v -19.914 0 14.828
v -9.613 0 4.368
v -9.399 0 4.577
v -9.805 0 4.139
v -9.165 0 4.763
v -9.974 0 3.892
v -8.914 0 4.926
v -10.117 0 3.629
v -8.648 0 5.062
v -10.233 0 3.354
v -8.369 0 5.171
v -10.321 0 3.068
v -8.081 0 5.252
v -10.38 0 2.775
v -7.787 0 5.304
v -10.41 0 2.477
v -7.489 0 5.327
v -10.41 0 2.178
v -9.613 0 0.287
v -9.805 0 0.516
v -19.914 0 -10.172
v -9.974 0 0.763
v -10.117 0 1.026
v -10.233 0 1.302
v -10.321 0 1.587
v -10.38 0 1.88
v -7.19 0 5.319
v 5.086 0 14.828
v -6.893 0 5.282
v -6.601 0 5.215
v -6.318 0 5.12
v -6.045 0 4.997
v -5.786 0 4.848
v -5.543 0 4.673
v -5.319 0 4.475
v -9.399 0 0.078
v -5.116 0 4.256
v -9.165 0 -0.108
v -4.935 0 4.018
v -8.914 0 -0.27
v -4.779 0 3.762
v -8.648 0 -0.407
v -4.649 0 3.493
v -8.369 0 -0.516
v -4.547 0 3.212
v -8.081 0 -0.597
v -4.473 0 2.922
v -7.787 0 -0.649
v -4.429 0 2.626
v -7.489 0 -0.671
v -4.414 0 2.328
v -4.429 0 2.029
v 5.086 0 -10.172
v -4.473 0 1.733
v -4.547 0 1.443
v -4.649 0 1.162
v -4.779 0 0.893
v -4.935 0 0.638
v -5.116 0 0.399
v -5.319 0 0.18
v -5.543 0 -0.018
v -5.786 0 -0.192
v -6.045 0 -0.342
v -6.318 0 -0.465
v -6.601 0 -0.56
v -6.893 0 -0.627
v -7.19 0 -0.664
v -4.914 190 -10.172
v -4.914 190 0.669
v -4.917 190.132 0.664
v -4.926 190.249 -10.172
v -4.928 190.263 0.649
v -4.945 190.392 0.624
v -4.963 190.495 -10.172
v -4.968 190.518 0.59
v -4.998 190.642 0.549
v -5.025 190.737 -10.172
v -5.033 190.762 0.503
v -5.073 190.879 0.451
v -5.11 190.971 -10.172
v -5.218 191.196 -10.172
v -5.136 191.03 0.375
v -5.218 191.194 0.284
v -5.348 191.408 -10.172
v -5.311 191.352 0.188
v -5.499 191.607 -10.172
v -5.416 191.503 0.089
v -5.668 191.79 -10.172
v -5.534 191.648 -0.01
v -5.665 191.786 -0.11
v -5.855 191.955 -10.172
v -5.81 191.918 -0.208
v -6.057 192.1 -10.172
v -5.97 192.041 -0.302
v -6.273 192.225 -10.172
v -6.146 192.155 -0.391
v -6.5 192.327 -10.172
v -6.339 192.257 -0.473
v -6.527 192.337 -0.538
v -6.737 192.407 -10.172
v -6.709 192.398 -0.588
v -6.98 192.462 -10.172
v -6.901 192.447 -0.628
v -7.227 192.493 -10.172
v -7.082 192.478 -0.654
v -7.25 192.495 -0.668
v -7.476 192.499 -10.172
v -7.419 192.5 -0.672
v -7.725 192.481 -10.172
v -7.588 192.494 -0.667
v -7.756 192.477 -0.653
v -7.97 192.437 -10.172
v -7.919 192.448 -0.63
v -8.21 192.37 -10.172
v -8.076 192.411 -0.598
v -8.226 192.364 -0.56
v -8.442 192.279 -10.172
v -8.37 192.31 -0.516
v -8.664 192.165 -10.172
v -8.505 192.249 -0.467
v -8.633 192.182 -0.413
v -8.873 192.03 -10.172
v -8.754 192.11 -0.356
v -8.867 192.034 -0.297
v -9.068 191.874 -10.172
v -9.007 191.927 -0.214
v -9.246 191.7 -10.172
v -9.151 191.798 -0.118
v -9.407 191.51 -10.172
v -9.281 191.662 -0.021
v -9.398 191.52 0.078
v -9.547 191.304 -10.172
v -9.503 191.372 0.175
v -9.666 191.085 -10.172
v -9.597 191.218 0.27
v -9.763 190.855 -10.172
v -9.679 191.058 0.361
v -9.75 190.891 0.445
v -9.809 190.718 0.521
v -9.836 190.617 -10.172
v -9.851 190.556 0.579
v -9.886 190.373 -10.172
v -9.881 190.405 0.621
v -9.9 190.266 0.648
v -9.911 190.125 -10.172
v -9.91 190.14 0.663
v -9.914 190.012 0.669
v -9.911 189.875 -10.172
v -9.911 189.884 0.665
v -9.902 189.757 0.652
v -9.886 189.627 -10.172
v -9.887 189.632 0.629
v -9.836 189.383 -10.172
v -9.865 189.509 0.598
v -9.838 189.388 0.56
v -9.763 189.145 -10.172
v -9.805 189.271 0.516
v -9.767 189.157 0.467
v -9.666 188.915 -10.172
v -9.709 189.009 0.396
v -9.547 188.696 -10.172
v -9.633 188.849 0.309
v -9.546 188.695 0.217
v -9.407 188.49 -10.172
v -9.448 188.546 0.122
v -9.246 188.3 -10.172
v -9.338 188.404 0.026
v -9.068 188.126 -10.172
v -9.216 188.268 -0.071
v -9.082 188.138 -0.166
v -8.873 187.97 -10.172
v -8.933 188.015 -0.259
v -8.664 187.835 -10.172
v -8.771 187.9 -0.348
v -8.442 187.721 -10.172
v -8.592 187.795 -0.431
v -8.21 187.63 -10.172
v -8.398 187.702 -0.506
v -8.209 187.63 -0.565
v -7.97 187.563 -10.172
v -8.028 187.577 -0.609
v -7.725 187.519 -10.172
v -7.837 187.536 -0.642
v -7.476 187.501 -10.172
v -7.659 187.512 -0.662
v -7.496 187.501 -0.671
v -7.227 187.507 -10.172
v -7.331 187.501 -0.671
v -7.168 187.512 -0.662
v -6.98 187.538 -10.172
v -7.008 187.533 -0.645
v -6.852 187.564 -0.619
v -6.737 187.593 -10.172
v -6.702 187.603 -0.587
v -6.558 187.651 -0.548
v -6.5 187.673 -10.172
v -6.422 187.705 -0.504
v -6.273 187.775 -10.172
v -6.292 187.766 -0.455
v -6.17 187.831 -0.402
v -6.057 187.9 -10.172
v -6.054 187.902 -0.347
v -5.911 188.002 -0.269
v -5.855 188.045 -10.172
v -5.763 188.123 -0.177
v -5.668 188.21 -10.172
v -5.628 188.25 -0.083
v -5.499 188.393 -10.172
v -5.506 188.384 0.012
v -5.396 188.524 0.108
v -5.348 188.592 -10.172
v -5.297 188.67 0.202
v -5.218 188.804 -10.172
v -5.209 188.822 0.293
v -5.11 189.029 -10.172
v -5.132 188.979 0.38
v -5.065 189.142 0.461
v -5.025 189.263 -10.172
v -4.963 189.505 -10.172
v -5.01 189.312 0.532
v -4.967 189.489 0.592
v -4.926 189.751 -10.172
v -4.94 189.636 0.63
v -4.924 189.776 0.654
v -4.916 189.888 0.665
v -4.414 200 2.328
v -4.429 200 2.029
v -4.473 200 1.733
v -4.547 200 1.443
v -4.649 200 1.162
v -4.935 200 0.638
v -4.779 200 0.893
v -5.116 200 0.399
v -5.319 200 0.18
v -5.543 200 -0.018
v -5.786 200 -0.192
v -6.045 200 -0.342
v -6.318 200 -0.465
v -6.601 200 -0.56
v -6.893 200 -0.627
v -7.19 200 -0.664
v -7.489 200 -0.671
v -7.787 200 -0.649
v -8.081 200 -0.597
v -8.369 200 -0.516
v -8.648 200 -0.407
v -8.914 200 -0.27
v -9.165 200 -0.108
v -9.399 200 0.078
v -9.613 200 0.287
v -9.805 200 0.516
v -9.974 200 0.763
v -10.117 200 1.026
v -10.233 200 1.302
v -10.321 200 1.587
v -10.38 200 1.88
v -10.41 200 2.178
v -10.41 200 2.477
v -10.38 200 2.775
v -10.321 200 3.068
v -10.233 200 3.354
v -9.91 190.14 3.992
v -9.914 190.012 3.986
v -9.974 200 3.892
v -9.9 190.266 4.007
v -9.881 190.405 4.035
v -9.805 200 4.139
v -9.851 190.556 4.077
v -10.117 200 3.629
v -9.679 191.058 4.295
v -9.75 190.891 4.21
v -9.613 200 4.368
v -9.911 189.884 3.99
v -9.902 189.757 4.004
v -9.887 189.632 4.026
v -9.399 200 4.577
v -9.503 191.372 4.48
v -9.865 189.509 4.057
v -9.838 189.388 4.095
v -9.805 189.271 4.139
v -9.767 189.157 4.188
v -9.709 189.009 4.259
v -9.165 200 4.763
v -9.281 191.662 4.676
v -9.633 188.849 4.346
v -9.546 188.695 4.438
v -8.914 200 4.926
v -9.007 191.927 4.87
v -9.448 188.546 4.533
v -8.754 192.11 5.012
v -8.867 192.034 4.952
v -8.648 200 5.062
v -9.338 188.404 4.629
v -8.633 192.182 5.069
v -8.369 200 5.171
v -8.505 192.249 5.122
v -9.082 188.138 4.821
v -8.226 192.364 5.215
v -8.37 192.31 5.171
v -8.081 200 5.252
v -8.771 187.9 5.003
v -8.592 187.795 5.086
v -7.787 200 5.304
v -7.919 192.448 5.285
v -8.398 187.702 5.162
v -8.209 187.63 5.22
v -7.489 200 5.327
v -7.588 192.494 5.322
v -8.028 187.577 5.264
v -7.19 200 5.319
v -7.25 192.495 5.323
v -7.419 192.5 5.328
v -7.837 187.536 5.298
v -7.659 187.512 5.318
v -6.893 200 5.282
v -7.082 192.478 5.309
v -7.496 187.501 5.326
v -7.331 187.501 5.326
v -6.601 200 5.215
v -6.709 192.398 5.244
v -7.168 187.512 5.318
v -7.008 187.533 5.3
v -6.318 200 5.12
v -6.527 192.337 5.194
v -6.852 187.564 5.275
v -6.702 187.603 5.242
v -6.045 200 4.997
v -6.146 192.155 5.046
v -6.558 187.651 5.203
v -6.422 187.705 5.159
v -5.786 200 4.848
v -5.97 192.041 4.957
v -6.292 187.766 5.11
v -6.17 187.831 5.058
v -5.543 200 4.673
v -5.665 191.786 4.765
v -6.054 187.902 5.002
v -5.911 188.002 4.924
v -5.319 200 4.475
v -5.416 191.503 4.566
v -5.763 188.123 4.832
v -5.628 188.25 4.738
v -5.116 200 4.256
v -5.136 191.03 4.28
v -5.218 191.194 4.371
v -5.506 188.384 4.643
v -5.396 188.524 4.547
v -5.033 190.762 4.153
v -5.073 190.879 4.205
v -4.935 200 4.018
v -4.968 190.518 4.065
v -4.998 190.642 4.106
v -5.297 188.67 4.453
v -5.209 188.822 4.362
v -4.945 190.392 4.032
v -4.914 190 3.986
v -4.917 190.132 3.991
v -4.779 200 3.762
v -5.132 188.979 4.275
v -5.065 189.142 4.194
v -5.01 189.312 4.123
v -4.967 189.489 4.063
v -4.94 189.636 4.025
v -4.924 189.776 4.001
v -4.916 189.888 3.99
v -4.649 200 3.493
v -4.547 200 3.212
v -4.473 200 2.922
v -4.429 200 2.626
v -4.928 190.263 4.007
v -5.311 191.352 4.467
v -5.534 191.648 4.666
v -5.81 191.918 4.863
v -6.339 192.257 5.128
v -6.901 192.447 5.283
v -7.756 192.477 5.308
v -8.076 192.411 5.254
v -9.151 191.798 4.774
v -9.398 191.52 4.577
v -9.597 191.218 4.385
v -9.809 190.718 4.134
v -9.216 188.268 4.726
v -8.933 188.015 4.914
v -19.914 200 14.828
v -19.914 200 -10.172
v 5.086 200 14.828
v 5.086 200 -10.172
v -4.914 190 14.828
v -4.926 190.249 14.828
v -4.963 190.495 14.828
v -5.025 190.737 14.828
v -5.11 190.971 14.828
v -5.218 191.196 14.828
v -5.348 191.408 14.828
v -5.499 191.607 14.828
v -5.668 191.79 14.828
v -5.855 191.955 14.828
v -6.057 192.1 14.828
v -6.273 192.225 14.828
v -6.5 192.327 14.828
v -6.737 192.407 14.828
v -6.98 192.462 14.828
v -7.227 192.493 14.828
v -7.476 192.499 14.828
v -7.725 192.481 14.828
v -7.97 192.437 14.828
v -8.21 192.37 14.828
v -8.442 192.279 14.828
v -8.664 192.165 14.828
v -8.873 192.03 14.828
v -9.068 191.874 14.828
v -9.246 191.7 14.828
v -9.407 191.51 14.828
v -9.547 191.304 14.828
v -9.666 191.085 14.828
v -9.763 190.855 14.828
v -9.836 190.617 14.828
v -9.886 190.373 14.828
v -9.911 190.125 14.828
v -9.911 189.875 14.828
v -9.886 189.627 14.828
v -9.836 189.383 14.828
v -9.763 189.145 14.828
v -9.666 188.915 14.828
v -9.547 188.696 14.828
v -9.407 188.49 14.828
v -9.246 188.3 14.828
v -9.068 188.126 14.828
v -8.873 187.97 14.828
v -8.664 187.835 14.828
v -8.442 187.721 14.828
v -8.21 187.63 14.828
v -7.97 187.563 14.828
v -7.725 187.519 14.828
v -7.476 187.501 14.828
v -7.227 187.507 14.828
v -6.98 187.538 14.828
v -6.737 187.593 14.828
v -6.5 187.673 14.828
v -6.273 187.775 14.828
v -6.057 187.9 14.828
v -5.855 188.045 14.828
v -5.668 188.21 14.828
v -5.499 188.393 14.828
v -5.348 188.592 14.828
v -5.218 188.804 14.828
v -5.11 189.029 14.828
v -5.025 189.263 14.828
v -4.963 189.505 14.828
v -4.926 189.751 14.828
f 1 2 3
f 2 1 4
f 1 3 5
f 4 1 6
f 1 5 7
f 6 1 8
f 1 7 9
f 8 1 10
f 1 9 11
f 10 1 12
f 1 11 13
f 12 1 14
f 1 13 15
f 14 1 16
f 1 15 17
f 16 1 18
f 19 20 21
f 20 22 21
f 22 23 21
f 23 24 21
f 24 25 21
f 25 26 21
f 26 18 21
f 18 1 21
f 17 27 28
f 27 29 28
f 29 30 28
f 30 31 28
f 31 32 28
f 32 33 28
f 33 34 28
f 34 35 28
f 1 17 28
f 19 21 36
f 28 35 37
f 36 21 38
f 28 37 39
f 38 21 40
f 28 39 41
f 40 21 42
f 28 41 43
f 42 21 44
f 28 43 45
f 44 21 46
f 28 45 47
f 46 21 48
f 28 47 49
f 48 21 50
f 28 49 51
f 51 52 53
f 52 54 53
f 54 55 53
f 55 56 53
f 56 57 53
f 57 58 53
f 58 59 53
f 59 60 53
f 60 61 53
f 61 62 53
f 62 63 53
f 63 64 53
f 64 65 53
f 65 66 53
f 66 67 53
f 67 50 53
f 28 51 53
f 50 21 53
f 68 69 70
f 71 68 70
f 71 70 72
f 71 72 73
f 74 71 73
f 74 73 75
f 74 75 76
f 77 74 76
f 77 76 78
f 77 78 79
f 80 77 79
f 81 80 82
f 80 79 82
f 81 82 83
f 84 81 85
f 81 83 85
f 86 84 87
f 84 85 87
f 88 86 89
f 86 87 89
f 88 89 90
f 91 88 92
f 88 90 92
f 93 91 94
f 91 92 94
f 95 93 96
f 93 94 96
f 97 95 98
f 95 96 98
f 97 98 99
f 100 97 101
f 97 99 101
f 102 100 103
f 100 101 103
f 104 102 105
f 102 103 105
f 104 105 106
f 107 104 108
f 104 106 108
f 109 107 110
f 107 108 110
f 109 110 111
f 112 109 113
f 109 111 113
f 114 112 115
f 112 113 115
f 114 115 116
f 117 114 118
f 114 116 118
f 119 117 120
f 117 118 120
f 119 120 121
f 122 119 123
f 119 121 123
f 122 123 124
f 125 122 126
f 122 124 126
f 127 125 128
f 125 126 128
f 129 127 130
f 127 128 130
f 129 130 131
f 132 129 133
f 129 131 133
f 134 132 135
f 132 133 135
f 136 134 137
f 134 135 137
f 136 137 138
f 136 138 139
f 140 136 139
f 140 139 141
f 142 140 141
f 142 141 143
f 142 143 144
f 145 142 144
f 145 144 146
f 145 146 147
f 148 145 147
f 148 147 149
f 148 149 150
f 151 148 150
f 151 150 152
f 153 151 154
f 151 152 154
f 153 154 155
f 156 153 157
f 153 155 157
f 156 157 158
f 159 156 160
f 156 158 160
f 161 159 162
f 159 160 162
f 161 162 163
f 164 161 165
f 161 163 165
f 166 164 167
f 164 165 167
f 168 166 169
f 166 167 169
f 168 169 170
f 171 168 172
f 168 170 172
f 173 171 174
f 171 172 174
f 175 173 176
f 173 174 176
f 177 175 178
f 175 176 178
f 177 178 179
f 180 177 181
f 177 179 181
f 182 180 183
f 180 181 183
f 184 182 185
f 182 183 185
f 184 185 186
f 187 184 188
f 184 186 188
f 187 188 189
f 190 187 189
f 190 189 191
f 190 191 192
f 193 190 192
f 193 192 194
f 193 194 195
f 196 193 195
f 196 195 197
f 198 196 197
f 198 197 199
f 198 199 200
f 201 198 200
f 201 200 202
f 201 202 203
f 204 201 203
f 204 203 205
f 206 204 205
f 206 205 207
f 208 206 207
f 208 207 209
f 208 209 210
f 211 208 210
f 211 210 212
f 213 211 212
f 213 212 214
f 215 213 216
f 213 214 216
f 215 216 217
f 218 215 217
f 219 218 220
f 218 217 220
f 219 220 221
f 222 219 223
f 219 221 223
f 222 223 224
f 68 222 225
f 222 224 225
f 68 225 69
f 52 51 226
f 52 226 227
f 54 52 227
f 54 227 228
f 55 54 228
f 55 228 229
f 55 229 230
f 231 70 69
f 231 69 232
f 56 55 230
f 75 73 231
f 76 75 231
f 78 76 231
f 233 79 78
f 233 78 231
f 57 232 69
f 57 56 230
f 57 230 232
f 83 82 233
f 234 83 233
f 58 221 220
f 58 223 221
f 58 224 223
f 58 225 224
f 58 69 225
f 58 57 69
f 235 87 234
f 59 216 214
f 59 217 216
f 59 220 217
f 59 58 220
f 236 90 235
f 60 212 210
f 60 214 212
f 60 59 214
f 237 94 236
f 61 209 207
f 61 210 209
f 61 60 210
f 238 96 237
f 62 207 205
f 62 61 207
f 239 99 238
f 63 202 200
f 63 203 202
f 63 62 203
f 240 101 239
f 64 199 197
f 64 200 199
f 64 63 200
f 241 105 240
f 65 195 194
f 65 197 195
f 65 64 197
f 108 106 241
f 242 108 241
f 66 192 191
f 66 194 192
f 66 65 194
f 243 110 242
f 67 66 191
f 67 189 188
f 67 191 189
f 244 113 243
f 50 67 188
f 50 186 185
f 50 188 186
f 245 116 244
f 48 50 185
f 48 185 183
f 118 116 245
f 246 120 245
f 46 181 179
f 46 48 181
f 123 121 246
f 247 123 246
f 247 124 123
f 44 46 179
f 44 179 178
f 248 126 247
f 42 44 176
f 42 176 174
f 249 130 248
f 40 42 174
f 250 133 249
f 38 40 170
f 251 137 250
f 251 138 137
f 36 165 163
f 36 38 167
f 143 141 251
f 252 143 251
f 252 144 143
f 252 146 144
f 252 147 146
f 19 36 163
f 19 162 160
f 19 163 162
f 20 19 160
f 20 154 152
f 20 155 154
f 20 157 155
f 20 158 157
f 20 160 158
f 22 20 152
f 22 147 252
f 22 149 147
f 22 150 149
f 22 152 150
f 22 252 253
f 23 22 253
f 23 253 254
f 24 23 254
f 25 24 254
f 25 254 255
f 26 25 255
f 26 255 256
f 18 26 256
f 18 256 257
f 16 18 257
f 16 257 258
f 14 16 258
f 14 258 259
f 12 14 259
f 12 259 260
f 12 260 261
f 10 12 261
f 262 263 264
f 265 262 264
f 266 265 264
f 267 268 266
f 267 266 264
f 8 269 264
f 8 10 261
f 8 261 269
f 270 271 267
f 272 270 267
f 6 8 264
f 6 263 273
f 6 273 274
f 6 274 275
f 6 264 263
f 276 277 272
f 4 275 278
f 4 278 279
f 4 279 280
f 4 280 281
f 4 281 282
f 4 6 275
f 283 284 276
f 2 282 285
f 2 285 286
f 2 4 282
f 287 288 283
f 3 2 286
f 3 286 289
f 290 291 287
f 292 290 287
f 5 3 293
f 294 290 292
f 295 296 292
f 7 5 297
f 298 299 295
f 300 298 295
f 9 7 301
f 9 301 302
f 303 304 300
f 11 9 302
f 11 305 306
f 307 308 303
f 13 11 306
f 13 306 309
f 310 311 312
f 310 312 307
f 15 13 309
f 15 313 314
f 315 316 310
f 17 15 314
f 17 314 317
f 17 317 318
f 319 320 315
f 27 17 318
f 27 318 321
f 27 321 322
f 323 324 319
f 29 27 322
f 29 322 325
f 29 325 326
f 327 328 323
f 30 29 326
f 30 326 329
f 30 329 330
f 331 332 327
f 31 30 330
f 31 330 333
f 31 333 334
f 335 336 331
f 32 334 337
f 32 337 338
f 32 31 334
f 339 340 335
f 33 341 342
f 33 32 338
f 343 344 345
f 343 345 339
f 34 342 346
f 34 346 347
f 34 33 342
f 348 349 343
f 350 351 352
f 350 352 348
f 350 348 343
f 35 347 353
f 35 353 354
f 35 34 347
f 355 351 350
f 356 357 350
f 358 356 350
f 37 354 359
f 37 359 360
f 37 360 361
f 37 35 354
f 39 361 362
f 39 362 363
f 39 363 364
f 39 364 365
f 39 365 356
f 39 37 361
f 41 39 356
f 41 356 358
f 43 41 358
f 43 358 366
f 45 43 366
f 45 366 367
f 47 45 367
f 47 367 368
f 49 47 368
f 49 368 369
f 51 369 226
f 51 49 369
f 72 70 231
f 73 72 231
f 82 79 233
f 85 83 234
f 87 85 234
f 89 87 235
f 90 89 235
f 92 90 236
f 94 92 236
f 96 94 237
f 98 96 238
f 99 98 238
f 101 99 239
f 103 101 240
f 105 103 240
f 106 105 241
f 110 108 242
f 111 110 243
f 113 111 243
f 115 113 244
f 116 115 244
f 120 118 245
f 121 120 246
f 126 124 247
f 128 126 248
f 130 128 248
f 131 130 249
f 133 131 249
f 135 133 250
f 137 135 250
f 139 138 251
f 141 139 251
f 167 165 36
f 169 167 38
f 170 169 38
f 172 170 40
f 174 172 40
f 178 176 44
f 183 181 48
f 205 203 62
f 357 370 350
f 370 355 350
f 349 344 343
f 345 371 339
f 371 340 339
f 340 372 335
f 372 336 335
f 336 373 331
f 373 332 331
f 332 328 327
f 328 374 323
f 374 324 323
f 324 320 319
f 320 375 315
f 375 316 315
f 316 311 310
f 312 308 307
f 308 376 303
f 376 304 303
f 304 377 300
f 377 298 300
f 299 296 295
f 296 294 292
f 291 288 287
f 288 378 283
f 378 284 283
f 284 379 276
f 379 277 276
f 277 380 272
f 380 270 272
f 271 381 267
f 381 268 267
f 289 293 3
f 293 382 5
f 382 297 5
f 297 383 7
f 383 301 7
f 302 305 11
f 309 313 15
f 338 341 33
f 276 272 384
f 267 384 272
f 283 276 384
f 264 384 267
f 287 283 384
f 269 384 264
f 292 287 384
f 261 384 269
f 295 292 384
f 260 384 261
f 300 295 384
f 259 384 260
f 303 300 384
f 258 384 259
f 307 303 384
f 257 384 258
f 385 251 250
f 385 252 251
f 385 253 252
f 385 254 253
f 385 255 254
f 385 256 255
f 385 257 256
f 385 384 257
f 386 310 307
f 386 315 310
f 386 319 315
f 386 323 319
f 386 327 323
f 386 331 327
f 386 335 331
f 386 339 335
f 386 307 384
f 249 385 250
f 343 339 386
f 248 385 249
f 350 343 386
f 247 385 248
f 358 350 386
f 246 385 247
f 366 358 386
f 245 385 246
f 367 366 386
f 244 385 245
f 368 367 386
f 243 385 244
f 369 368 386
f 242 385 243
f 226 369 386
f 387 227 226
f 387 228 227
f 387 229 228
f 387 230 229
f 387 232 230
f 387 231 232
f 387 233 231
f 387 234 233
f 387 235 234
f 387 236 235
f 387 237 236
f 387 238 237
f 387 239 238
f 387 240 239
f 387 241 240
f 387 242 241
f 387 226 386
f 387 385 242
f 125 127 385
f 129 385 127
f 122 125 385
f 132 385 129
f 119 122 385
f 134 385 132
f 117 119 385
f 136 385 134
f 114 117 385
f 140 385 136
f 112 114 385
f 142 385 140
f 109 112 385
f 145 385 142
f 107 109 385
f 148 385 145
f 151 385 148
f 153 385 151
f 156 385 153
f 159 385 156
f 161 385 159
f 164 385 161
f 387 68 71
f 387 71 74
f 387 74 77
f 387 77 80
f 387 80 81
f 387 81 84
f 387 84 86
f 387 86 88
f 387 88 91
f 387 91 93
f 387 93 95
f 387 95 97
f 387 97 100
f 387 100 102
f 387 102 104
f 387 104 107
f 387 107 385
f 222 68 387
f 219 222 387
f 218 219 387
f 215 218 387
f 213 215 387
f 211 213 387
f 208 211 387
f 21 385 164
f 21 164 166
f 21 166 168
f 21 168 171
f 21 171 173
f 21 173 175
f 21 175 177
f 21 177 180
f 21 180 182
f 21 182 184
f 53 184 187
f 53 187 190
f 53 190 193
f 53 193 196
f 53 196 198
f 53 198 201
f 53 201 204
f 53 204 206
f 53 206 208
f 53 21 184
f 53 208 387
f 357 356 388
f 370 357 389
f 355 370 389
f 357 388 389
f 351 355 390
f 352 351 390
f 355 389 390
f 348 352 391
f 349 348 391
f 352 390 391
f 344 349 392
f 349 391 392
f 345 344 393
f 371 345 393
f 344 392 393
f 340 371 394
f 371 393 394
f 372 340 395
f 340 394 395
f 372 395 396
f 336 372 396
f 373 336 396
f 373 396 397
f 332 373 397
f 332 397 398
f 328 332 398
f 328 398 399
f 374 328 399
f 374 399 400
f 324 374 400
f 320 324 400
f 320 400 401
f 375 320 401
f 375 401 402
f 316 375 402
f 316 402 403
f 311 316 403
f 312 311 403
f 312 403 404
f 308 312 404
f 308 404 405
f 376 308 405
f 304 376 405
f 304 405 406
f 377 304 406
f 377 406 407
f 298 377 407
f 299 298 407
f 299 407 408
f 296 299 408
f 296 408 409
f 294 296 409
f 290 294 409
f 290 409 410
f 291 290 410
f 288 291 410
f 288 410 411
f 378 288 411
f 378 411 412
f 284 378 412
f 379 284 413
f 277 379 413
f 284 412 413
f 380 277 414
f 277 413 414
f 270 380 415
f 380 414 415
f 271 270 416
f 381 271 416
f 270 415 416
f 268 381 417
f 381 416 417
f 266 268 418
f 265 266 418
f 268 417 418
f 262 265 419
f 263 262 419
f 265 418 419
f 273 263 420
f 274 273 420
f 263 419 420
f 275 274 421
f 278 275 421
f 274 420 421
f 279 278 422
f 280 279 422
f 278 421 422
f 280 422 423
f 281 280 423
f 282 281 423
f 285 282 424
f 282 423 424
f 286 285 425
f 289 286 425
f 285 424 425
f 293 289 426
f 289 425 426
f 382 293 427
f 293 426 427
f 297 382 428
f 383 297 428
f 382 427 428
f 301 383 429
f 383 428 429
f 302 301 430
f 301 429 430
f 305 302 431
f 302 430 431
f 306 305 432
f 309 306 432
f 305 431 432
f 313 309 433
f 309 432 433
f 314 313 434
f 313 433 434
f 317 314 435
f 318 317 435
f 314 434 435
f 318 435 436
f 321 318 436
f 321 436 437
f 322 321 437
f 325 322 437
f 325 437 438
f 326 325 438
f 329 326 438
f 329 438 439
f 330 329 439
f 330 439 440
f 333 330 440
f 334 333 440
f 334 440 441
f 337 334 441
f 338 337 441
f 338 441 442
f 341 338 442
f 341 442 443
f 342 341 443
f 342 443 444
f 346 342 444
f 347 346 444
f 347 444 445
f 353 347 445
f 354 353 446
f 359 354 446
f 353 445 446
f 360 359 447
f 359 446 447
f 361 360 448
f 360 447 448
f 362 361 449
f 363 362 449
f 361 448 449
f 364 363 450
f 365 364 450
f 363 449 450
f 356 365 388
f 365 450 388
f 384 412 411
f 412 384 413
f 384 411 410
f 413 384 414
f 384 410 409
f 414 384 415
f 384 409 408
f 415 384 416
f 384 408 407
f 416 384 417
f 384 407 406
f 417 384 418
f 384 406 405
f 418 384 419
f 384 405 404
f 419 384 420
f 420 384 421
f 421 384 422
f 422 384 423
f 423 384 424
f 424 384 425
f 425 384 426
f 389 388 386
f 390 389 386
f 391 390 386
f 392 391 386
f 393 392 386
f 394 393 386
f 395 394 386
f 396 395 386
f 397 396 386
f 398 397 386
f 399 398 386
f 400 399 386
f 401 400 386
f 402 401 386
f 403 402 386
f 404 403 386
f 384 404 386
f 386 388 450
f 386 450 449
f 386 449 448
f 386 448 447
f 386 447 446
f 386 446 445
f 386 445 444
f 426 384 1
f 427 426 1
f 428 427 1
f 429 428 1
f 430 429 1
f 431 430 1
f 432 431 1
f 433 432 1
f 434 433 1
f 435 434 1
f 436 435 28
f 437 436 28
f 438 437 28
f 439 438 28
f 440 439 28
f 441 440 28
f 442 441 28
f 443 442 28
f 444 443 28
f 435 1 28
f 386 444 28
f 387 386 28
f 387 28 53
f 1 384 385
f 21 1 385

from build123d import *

# Parameters (mm, degrees)
SKETCH1_W           = 25
SKETCH1_H           = 25
SKETCH1_R           = 3
BOSS_EXTRUDE1_DEPTH = 200
SKETCH2_R           = 2.5
CUT_EXTRUDE1_DEPTH  = 26


with BuildPart() as part:
    # Sketch1 → Boss-Extrude1 (new body)
    with BuildSketch(Plane(origin=(0, 0, 0), x_dir=(1, 0, 0), z_dir=(0, 1, 0))):
        with Locations((-7.413793103, -2.327586207)):
            Rectangle(SKETCH1_W, SKETCH1_H)
        with Locations((-7.413793103, -2.327586207)):
            Circle(SKETCH1_R, mode=Mode.SUBTRACT)
    extrude(amount=BOSS_EXTRUDE1_DEPTH)

    # Sketch2 → Cut-Extrude1 (cut, through all)
    with BuildSketch(Plane.XY.offset(14.827586207)):
        with Locations((-7.413793103, 190)):
            Circle(SKETCH2_R)
    extrude(amount=-CUT_EXTRUDE1_DEPTH, mode=Mode.SUBTRACT)


solid = part.part
